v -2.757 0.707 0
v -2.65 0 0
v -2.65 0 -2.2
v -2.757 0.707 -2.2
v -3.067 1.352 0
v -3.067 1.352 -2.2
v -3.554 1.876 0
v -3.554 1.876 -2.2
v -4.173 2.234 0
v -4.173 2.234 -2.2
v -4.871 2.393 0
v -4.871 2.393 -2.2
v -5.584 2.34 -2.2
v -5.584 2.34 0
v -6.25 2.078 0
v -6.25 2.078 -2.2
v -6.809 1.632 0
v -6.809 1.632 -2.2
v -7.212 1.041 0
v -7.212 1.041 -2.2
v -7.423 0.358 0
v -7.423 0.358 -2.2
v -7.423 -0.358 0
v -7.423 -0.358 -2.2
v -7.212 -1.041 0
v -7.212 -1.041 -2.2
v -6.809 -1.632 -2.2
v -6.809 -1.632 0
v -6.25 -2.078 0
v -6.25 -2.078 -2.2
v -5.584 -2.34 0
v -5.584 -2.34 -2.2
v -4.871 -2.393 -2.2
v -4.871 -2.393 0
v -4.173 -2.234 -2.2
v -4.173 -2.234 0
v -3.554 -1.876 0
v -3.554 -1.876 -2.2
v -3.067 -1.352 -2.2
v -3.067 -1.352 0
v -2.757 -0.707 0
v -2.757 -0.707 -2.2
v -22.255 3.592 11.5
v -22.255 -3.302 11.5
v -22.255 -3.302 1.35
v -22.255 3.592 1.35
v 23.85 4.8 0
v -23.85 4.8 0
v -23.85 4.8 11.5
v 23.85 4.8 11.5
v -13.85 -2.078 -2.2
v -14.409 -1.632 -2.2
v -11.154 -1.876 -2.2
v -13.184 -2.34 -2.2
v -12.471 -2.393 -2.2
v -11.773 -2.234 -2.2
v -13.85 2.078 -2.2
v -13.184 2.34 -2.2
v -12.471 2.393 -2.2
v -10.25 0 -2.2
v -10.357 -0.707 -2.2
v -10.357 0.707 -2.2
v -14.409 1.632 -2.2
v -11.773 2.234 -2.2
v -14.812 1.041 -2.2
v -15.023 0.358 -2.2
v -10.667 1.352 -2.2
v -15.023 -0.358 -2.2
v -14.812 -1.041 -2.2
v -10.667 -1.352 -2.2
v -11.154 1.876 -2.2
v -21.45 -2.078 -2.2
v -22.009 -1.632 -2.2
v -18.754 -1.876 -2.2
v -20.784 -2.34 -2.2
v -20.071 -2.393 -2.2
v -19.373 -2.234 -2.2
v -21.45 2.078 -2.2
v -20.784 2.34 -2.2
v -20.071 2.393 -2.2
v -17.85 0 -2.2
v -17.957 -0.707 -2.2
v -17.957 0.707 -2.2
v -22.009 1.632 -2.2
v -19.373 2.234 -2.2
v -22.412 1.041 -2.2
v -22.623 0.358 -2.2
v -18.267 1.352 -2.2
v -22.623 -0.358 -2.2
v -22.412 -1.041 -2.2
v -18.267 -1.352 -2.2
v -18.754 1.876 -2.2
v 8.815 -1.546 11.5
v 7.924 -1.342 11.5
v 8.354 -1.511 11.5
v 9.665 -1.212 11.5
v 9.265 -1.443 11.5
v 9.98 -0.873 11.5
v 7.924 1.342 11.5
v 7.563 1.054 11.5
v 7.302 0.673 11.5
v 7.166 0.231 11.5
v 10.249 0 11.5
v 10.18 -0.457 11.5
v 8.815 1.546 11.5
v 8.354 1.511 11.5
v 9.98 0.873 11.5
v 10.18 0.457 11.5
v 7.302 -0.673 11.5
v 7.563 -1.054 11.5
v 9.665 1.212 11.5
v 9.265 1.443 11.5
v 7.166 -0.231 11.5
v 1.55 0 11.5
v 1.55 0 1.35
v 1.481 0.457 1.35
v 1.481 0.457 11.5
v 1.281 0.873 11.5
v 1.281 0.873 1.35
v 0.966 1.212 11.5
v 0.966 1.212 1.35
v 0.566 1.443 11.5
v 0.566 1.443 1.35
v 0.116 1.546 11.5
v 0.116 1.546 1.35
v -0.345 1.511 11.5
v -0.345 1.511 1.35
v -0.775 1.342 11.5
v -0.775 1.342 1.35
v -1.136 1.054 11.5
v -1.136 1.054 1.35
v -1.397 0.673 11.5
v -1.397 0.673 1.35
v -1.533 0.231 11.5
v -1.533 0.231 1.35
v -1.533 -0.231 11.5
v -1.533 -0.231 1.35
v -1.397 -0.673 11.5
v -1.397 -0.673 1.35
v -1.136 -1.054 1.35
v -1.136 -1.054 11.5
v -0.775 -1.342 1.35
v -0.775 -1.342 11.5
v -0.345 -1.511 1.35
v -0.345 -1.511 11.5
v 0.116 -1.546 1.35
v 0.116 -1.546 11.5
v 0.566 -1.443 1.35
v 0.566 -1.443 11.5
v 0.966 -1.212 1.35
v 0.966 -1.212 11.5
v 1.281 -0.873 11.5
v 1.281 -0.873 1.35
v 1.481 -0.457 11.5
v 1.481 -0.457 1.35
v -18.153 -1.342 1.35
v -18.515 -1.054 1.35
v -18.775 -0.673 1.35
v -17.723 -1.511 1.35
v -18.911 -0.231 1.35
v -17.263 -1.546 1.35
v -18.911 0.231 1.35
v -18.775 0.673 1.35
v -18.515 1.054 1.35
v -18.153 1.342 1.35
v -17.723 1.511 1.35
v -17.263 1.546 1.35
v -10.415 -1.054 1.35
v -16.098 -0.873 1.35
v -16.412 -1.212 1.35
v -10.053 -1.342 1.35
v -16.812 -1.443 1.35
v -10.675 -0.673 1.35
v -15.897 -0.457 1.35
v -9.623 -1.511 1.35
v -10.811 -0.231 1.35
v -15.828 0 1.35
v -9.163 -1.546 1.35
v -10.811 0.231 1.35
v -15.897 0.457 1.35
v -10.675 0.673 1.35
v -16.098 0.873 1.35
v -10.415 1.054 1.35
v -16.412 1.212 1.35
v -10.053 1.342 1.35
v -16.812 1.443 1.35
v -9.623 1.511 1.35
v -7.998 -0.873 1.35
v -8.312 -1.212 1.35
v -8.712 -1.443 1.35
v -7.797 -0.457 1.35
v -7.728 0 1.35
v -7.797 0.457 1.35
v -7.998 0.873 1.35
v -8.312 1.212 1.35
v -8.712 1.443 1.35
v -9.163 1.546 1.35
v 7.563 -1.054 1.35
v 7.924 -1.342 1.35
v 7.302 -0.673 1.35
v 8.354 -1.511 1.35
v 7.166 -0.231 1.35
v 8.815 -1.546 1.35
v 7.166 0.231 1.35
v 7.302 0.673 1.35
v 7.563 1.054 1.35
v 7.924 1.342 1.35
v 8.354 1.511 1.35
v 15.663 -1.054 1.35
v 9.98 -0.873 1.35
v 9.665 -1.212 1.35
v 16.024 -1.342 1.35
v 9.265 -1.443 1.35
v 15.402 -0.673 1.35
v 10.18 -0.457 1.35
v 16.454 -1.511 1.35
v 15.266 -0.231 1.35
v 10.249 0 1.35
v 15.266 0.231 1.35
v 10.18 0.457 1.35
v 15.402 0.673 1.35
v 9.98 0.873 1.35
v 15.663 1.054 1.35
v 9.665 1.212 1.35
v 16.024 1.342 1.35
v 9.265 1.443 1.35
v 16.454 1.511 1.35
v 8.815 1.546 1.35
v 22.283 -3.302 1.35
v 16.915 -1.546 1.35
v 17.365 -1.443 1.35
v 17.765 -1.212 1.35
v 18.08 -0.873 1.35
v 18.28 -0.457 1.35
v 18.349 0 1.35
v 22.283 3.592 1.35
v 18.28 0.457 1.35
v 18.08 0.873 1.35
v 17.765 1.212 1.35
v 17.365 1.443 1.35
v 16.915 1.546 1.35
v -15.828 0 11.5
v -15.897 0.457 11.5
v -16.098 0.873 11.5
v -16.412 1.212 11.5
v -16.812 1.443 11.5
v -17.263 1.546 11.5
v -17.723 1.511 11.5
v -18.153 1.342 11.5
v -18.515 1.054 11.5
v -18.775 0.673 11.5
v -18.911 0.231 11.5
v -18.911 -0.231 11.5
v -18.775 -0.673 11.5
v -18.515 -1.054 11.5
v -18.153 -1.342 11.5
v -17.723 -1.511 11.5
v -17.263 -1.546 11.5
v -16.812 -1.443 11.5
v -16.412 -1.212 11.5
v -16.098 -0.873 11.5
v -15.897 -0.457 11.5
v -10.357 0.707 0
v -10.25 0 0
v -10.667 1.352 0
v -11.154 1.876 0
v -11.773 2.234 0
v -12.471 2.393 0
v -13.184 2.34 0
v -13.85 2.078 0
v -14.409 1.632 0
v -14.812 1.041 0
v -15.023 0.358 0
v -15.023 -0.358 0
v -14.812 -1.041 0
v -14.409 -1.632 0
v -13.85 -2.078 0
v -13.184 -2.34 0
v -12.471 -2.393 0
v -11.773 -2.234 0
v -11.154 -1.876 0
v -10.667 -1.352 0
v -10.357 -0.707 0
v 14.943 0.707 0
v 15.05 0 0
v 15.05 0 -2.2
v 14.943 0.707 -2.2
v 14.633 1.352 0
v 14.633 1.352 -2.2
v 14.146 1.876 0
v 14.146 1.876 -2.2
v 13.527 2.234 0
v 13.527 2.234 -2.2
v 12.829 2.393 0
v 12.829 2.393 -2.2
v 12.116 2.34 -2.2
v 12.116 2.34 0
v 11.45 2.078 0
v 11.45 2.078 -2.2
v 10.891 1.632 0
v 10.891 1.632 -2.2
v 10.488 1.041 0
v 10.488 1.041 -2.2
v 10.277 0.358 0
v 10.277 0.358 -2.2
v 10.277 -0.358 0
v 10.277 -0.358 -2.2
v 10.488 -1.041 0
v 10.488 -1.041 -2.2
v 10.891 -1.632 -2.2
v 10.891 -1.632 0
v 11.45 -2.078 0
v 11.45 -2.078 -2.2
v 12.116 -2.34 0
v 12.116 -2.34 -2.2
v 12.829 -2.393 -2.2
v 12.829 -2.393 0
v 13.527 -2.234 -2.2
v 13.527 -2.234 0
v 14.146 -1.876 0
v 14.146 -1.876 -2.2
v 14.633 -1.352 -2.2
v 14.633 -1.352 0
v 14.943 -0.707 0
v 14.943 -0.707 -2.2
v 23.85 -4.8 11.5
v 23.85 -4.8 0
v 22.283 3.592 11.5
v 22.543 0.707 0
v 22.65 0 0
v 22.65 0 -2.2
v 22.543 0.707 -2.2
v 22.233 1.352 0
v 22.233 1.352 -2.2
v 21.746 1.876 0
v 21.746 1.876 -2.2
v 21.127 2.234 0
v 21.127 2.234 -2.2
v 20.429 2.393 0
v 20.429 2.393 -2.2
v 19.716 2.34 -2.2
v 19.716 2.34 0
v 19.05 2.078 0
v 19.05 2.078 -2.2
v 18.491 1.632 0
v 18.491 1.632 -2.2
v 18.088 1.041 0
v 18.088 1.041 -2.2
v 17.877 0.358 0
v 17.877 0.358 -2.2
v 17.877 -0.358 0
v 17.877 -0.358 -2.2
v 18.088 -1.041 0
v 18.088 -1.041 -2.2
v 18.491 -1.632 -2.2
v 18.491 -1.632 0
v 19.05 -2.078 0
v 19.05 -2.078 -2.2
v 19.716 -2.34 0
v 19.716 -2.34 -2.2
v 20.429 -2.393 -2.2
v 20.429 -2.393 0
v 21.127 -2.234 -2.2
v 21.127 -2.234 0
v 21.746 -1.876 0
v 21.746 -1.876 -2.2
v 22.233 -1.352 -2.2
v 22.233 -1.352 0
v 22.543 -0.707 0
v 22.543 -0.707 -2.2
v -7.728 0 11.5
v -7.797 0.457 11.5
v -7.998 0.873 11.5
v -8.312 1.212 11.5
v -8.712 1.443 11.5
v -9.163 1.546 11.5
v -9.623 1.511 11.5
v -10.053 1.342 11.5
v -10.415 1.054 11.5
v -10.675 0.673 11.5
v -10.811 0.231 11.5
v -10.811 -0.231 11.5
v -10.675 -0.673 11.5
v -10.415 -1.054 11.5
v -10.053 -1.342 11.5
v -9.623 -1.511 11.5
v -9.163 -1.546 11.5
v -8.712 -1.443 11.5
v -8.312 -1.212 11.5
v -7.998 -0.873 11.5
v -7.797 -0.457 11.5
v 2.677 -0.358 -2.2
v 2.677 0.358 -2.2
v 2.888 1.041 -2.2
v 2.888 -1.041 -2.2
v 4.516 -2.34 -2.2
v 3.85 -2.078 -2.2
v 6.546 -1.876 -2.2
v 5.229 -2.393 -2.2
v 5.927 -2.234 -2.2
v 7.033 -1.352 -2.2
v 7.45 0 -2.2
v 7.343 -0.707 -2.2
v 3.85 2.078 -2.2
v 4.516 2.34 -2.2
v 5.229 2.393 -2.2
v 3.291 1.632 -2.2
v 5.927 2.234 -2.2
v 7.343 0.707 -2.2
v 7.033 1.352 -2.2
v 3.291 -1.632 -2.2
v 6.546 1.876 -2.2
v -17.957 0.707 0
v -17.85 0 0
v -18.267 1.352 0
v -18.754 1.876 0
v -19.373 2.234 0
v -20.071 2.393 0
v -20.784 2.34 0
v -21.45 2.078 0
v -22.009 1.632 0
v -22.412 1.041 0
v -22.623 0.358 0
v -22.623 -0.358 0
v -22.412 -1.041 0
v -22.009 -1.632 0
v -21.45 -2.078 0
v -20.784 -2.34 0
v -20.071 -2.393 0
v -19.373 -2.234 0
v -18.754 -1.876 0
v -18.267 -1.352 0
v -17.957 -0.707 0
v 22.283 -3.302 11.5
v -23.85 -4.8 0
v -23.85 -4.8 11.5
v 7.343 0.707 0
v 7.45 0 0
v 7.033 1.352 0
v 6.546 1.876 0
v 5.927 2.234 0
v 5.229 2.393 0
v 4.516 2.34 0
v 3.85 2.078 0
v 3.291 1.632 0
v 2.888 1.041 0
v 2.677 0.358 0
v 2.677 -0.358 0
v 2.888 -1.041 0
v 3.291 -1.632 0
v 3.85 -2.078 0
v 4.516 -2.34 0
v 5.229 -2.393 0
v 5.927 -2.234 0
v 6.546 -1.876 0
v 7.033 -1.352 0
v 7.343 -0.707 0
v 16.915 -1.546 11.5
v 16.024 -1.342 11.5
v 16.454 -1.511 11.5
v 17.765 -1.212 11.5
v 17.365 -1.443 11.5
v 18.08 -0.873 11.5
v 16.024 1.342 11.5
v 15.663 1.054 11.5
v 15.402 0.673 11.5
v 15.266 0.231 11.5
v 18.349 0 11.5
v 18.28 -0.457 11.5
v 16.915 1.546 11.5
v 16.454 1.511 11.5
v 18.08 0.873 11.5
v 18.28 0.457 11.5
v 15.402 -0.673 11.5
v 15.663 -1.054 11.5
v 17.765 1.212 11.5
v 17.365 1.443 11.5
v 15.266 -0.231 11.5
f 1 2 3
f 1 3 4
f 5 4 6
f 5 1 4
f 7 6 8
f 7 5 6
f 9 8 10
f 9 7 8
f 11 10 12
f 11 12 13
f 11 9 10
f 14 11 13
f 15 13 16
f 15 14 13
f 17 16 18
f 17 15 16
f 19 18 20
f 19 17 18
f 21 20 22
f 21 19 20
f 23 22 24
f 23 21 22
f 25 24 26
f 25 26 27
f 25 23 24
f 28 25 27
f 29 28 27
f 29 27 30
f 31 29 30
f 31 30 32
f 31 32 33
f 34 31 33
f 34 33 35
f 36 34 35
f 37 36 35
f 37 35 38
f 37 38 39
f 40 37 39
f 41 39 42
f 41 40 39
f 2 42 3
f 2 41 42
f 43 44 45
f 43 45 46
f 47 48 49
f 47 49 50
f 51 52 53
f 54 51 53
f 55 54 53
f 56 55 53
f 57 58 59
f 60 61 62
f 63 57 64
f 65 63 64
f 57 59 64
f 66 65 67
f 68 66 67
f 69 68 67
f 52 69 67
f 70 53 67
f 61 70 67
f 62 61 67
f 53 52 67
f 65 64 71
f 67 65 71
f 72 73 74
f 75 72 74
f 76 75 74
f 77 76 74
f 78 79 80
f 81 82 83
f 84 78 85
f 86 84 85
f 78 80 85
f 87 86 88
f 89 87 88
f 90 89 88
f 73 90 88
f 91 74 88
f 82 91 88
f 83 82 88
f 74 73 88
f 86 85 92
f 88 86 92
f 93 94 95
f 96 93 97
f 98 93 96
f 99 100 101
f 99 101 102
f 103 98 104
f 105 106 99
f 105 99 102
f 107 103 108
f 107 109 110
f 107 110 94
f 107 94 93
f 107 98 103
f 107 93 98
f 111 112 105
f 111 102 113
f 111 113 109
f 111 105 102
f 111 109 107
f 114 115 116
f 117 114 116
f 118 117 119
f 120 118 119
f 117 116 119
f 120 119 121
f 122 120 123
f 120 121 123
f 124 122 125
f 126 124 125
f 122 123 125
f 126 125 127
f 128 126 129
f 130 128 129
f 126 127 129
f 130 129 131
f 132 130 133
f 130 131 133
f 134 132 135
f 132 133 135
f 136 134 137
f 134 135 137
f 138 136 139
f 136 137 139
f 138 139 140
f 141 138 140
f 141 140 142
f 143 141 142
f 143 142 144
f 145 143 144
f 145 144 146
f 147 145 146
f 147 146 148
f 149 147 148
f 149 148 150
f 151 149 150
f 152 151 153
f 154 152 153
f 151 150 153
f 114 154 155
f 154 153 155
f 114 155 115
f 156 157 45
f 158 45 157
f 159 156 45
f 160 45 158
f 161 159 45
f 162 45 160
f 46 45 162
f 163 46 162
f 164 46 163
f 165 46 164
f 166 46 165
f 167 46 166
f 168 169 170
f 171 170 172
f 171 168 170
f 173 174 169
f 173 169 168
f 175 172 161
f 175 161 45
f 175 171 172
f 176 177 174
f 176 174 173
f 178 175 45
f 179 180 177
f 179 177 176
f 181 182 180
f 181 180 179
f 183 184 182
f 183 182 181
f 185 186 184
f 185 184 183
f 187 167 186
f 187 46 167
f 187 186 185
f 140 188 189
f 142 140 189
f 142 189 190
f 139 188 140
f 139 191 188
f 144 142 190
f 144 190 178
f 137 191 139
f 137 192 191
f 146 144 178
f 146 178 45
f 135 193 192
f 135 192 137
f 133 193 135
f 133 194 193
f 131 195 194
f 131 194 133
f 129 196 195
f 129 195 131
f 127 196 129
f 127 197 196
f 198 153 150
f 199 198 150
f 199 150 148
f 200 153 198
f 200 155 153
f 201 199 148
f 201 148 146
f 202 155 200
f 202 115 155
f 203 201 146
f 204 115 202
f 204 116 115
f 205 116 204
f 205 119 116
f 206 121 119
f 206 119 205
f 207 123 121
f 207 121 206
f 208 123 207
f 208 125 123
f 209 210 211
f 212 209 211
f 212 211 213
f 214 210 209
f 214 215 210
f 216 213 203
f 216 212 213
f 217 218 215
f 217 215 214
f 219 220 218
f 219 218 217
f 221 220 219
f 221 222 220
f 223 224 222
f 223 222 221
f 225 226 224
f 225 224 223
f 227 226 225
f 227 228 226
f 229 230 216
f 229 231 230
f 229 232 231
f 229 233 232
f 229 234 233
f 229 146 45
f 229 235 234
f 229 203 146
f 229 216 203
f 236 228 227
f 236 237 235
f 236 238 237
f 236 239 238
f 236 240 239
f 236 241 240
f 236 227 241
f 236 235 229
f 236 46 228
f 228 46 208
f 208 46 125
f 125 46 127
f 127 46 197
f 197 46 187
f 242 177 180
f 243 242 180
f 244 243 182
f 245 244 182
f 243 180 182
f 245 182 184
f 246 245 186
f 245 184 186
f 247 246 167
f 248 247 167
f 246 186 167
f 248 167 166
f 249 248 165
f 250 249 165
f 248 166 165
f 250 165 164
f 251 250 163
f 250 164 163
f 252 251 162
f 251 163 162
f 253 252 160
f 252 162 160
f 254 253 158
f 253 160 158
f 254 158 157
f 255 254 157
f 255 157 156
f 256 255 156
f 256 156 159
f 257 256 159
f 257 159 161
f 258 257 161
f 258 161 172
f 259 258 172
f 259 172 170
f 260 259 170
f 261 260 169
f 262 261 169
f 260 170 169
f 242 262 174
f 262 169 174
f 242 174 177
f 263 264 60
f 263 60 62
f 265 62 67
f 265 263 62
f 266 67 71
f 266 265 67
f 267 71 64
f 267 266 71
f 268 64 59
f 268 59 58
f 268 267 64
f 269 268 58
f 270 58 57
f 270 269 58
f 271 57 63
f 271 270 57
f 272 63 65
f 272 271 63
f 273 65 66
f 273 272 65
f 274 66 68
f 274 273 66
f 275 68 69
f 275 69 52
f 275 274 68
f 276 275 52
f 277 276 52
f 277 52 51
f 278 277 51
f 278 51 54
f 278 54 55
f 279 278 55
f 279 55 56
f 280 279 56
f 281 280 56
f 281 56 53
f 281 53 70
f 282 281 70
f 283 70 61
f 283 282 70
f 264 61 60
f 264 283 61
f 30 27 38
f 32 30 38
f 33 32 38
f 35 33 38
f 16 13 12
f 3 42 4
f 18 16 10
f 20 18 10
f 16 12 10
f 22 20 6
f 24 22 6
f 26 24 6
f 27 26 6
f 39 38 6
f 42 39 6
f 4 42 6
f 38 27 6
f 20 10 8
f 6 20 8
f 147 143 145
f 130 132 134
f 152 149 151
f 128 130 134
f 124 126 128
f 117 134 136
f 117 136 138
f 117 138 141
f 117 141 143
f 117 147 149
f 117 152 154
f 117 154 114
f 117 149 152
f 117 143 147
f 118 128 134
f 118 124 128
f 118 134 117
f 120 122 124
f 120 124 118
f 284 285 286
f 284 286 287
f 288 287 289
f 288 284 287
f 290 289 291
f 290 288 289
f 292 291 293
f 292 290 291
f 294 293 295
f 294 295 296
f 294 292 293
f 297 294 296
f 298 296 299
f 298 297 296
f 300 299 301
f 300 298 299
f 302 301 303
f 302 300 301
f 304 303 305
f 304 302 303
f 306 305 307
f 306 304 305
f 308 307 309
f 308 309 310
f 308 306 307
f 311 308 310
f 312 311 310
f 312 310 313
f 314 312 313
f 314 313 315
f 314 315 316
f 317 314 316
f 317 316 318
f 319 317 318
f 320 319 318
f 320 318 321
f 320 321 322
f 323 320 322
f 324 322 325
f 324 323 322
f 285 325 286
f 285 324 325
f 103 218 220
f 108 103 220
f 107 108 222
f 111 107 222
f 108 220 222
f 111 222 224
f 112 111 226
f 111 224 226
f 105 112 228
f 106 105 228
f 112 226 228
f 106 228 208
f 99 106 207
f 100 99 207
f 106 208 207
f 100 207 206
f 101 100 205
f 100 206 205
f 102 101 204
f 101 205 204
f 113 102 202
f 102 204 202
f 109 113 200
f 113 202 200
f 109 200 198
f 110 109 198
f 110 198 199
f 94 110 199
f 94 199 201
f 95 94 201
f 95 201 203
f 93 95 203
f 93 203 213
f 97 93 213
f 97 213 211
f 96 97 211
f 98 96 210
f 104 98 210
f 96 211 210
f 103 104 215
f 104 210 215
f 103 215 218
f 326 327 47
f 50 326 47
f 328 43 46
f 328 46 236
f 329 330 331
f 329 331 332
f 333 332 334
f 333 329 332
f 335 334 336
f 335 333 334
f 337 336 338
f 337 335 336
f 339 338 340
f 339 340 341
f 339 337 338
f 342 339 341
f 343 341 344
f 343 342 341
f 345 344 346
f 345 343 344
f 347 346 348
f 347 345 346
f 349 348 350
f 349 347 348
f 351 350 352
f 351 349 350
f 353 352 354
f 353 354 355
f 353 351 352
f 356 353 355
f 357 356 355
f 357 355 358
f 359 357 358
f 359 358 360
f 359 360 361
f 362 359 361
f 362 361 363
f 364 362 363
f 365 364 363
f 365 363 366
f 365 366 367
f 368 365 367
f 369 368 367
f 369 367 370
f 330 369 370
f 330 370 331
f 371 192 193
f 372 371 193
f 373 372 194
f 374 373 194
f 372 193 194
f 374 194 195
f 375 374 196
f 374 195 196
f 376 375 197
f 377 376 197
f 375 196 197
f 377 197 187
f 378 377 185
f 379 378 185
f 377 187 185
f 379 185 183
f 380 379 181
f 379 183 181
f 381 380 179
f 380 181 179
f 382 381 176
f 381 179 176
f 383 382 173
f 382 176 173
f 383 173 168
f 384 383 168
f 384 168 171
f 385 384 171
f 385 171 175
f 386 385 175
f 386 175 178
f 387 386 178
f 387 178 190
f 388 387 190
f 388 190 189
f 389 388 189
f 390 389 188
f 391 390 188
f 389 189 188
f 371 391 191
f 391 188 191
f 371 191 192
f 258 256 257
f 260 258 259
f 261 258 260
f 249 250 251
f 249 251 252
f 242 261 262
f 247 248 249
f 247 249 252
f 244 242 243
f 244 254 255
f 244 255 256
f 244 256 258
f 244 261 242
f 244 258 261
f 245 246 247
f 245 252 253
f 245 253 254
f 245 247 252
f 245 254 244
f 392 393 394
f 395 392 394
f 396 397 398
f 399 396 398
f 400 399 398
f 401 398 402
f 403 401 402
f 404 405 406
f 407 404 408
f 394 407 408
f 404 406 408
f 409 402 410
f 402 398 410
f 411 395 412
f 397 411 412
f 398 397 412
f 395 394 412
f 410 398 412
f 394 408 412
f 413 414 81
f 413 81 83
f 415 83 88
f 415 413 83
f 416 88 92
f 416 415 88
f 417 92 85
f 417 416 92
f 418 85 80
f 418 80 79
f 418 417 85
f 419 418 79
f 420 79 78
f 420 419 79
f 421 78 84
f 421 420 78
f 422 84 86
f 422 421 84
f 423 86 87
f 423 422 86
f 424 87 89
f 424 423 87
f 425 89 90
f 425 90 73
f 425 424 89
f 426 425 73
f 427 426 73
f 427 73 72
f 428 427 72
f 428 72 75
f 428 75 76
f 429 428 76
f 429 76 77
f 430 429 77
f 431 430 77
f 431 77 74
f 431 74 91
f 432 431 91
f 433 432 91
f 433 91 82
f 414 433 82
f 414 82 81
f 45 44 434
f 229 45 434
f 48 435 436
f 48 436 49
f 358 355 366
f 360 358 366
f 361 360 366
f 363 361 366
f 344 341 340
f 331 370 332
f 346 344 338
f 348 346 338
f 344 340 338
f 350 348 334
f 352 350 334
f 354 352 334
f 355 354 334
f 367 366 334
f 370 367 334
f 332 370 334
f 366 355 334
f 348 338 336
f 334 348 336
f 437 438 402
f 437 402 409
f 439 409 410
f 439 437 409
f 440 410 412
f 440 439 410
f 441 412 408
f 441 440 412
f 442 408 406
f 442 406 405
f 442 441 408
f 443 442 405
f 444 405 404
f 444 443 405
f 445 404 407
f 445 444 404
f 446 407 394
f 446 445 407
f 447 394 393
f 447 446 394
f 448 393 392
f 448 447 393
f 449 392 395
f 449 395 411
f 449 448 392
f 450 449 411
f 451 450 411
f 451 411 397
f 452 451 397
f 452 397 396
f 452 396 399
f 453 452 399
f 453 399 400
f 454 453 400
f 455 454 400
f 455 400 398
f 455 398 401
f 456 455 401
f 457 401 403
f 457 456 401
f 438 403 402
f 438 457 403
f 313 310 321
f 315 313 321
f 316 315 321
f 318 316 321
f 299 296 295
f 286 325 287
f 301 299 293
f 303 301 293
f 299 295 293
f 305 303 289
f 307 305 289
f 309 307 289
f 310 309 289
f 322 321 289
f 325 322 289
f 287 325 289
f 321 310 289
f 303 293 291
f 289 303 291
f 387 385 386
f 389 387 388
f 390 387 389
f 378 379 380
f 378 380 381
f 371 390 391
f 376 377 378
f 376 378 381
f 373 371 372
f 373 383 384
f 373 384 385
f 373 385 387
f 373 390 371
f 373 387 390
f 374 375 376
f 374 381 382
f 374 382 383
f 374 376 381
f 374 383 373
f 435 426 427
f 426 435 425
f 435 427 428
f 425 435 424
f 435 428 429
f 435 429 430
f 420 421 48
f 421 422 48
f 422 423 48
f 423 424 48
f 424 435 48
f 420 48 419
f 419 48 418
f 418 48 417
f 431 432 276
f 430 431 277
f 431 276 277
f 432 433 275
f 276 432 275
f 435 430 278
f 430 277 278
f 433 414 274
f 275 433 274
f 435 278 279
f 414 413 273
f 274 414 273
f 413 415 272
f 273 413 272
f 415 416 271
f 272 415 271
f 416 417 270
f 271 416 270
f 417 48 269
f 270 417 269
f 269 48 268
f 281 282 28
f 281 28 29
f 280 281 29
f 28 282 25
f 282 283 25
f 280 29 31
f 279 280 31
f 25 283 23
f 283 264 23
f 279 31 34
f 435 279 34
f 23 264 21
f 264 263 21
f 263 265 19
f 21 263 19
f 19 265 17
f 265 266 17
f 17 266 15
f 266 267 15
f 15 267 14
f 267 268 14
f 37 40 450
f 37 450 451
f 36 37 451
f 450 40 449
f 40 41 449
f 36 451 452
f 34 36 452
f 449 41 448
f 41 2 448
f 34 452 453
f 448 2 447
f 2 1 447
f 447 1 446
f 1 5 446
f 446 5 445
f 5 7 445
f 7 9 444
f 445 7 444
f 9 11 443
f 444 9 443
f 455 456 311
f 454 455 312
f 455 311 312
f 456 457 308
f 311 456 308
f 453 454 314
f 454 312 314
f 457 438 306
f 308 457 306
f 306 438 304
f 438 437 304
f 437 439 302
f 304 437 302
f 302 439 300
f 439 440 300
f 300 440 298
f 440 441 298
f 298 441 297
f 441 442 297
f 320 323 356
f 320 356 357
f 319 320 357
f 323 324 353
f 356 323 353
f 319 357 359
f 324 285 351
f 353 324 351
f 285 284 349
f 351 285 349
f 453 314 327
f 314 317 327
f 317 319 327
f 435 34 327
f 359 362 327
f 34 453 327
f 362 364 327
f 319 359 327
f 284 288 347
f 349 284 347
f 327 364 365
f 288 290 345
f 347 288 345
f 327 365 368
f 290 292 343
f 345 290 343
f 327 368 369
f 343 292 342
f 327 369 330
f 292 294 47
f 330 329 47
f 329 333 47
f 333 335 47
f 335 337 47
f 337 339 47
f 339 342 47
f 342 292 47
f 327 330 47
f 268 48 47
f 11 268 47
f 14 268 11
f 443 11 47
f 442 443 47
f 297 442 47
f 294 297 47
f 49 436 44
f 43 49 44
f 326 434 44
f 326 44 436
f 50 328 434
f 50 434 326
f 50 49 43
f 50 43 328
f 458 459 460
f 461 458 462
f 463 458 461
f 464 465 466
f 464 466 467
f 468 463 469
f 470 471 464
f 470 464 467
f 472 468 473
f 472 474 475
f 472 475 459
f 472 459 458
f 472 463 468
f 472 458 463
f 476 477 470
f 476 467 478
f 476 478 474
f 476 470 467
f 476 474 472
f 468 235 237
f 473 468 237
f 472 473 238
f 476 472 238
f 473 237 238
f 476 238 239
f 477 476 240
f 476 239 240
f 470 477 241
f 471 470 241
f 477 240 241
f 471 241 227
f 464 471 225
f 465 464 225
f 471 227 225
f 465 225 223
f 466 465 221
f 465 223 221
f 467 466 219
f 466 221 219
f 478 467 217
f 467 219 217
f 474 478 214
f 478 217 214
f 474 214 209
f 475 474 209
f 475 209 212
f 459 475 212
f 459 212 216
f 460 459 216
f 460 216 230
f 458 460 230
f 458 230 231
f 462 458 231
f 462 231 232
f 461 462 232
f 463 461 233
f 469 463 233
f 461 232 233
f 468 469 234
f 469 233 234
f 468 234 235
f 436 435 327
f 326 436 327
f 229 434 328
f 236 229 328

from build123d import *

# Parameters (mm, degrees)
F0_W      = 47.7
F0_H      = 9.6
F0_R      = 2.4
F1_DEPTH  = 9.5
F2_DEPTH  = 2.2
F3_W      = 44.25676
F3_H      = 6.6
F3_R      = 1.55
F3_R_2    = 2.072202
F1_FACE_W = 47.7
F1_FACE_H = 9.6
F4_DEPTH  = 2
F5_W      = 44.538753
F5_H      = 6.894205
F6_DEPTH  = 10.15
F7_R      = 1.55
F8_DEPTH  = 10.15


with BuildPart() as f1:
    # F0 (on Top) → F1 (new body)
    with BuildSketch(Plane.XY):
        Rectangle(F0_W, F0_H)
        with Locations((-20.25, 0)):
            Circle(F0_R, mode=Mode.SUBTRACT)
        with Locations((-12.65, 0)):
            Circle(F0_R, mode=Mode.SUBTRACT)
        with Locations((-5.05, 0)):
            Circle(F0_R, mode=Mode.SUBTRACT)
        with Locations((5.05, 0)):
            Circle(F0_R, mode=Mode.SUBTRACT)
        with Locations((12.65, 0)):
            Circle(F0_R, mode=Mode.SUBTRACT)
        with Locations((20.25, 0)):
            Circle(F0_R, mode=Mode.SUBTRACT)
        with Locations((-20.25, 0)):
            Circle(F0_R)
        with Locations((-12.65, 0)):
            Circle(F0_R)
        with Locations((-5.05, 0)):
            Circle(F0_R)
        with Locations((5.05, 0)):
            Circle(F0_R)
        with Locations((12.65, 0)):
            Circle(F0_R)
        with Locations((20.25, 0)):
            Circle(F0_R)
    extrude(amount=F1_DEPTH)

    # F0 (on Top) → F2 (join)
    with BuildSketch(Plane.XY):
        with Locations((-20.25, 0)):
            Circle(F0_R)
        with Locations((-12.65, 0)):
            Circle(F0_R)
        with Locations((-5.05, 0)):
            Circle(F0_R)
        with Locations((5.05, 0)):
            Circle(F0_R)
        with Locations((12.65, 0)):
            Circle(F0_R)
        with Locations((20.25, 0)):
            Circle(F0_R)
    extrude(amount=-F2_DEPTH)

    # F3 (on Top) + F1_face (on face) → F4 (join)
    with BuildSketch(Plane.XY):
        Rectangle(F3_W, F3_H)
        with Locations((-19.1, 0)):
            Circle(F3_R, mode=Mode.SUBTRACT)
        with Locations((-12.5, 0)):
            Circle(F3_R, mode=Mode.SUBTRACT)
        Circle(F3_R_2, mode=Mode.SUBTRACT)
        with Locations((12.524975, 0)):
            Circle(F3_R, mode=Mode.SUBTRACT)
        with Locations((19.124975, 0)):
            Circle(F3_R, mode=Mode.SUBTRACT)
    with BuildSketch(Plane.XY.offset(9.5)):
        Rectangle(F1_FACE_W, F1_FACE_H)
    extrude(amount=F4_DEPTH)

    # F5 (on face) → F6 (cut)
    with BuildSketch(Plane.XY.offset(11.5)):
        with Locations((0.013958, 0.144912)):
            Rectangle(F5_W, F5_H)
    extrude(amount=-F6_DEPTH, mode=Mode.SUBTRACT)

    # F7 (on face) → F8 (join)
    with BuildSketch(Plane.XY.offset(1.35)):
        with Locations((-17.37838, 0)):
            Circle(F7_R)
        with Locations((-9.27838, 0)):
            Circle(F7_R)
        Circle(F7_R)
        with Locations((8.69896, 0)):
            Circle(F7_R)
        with Locations((16.79896, 0)):
            Circle(F7_R)
    extrude(amount=F8_DEPTH)


solid = f1.part
